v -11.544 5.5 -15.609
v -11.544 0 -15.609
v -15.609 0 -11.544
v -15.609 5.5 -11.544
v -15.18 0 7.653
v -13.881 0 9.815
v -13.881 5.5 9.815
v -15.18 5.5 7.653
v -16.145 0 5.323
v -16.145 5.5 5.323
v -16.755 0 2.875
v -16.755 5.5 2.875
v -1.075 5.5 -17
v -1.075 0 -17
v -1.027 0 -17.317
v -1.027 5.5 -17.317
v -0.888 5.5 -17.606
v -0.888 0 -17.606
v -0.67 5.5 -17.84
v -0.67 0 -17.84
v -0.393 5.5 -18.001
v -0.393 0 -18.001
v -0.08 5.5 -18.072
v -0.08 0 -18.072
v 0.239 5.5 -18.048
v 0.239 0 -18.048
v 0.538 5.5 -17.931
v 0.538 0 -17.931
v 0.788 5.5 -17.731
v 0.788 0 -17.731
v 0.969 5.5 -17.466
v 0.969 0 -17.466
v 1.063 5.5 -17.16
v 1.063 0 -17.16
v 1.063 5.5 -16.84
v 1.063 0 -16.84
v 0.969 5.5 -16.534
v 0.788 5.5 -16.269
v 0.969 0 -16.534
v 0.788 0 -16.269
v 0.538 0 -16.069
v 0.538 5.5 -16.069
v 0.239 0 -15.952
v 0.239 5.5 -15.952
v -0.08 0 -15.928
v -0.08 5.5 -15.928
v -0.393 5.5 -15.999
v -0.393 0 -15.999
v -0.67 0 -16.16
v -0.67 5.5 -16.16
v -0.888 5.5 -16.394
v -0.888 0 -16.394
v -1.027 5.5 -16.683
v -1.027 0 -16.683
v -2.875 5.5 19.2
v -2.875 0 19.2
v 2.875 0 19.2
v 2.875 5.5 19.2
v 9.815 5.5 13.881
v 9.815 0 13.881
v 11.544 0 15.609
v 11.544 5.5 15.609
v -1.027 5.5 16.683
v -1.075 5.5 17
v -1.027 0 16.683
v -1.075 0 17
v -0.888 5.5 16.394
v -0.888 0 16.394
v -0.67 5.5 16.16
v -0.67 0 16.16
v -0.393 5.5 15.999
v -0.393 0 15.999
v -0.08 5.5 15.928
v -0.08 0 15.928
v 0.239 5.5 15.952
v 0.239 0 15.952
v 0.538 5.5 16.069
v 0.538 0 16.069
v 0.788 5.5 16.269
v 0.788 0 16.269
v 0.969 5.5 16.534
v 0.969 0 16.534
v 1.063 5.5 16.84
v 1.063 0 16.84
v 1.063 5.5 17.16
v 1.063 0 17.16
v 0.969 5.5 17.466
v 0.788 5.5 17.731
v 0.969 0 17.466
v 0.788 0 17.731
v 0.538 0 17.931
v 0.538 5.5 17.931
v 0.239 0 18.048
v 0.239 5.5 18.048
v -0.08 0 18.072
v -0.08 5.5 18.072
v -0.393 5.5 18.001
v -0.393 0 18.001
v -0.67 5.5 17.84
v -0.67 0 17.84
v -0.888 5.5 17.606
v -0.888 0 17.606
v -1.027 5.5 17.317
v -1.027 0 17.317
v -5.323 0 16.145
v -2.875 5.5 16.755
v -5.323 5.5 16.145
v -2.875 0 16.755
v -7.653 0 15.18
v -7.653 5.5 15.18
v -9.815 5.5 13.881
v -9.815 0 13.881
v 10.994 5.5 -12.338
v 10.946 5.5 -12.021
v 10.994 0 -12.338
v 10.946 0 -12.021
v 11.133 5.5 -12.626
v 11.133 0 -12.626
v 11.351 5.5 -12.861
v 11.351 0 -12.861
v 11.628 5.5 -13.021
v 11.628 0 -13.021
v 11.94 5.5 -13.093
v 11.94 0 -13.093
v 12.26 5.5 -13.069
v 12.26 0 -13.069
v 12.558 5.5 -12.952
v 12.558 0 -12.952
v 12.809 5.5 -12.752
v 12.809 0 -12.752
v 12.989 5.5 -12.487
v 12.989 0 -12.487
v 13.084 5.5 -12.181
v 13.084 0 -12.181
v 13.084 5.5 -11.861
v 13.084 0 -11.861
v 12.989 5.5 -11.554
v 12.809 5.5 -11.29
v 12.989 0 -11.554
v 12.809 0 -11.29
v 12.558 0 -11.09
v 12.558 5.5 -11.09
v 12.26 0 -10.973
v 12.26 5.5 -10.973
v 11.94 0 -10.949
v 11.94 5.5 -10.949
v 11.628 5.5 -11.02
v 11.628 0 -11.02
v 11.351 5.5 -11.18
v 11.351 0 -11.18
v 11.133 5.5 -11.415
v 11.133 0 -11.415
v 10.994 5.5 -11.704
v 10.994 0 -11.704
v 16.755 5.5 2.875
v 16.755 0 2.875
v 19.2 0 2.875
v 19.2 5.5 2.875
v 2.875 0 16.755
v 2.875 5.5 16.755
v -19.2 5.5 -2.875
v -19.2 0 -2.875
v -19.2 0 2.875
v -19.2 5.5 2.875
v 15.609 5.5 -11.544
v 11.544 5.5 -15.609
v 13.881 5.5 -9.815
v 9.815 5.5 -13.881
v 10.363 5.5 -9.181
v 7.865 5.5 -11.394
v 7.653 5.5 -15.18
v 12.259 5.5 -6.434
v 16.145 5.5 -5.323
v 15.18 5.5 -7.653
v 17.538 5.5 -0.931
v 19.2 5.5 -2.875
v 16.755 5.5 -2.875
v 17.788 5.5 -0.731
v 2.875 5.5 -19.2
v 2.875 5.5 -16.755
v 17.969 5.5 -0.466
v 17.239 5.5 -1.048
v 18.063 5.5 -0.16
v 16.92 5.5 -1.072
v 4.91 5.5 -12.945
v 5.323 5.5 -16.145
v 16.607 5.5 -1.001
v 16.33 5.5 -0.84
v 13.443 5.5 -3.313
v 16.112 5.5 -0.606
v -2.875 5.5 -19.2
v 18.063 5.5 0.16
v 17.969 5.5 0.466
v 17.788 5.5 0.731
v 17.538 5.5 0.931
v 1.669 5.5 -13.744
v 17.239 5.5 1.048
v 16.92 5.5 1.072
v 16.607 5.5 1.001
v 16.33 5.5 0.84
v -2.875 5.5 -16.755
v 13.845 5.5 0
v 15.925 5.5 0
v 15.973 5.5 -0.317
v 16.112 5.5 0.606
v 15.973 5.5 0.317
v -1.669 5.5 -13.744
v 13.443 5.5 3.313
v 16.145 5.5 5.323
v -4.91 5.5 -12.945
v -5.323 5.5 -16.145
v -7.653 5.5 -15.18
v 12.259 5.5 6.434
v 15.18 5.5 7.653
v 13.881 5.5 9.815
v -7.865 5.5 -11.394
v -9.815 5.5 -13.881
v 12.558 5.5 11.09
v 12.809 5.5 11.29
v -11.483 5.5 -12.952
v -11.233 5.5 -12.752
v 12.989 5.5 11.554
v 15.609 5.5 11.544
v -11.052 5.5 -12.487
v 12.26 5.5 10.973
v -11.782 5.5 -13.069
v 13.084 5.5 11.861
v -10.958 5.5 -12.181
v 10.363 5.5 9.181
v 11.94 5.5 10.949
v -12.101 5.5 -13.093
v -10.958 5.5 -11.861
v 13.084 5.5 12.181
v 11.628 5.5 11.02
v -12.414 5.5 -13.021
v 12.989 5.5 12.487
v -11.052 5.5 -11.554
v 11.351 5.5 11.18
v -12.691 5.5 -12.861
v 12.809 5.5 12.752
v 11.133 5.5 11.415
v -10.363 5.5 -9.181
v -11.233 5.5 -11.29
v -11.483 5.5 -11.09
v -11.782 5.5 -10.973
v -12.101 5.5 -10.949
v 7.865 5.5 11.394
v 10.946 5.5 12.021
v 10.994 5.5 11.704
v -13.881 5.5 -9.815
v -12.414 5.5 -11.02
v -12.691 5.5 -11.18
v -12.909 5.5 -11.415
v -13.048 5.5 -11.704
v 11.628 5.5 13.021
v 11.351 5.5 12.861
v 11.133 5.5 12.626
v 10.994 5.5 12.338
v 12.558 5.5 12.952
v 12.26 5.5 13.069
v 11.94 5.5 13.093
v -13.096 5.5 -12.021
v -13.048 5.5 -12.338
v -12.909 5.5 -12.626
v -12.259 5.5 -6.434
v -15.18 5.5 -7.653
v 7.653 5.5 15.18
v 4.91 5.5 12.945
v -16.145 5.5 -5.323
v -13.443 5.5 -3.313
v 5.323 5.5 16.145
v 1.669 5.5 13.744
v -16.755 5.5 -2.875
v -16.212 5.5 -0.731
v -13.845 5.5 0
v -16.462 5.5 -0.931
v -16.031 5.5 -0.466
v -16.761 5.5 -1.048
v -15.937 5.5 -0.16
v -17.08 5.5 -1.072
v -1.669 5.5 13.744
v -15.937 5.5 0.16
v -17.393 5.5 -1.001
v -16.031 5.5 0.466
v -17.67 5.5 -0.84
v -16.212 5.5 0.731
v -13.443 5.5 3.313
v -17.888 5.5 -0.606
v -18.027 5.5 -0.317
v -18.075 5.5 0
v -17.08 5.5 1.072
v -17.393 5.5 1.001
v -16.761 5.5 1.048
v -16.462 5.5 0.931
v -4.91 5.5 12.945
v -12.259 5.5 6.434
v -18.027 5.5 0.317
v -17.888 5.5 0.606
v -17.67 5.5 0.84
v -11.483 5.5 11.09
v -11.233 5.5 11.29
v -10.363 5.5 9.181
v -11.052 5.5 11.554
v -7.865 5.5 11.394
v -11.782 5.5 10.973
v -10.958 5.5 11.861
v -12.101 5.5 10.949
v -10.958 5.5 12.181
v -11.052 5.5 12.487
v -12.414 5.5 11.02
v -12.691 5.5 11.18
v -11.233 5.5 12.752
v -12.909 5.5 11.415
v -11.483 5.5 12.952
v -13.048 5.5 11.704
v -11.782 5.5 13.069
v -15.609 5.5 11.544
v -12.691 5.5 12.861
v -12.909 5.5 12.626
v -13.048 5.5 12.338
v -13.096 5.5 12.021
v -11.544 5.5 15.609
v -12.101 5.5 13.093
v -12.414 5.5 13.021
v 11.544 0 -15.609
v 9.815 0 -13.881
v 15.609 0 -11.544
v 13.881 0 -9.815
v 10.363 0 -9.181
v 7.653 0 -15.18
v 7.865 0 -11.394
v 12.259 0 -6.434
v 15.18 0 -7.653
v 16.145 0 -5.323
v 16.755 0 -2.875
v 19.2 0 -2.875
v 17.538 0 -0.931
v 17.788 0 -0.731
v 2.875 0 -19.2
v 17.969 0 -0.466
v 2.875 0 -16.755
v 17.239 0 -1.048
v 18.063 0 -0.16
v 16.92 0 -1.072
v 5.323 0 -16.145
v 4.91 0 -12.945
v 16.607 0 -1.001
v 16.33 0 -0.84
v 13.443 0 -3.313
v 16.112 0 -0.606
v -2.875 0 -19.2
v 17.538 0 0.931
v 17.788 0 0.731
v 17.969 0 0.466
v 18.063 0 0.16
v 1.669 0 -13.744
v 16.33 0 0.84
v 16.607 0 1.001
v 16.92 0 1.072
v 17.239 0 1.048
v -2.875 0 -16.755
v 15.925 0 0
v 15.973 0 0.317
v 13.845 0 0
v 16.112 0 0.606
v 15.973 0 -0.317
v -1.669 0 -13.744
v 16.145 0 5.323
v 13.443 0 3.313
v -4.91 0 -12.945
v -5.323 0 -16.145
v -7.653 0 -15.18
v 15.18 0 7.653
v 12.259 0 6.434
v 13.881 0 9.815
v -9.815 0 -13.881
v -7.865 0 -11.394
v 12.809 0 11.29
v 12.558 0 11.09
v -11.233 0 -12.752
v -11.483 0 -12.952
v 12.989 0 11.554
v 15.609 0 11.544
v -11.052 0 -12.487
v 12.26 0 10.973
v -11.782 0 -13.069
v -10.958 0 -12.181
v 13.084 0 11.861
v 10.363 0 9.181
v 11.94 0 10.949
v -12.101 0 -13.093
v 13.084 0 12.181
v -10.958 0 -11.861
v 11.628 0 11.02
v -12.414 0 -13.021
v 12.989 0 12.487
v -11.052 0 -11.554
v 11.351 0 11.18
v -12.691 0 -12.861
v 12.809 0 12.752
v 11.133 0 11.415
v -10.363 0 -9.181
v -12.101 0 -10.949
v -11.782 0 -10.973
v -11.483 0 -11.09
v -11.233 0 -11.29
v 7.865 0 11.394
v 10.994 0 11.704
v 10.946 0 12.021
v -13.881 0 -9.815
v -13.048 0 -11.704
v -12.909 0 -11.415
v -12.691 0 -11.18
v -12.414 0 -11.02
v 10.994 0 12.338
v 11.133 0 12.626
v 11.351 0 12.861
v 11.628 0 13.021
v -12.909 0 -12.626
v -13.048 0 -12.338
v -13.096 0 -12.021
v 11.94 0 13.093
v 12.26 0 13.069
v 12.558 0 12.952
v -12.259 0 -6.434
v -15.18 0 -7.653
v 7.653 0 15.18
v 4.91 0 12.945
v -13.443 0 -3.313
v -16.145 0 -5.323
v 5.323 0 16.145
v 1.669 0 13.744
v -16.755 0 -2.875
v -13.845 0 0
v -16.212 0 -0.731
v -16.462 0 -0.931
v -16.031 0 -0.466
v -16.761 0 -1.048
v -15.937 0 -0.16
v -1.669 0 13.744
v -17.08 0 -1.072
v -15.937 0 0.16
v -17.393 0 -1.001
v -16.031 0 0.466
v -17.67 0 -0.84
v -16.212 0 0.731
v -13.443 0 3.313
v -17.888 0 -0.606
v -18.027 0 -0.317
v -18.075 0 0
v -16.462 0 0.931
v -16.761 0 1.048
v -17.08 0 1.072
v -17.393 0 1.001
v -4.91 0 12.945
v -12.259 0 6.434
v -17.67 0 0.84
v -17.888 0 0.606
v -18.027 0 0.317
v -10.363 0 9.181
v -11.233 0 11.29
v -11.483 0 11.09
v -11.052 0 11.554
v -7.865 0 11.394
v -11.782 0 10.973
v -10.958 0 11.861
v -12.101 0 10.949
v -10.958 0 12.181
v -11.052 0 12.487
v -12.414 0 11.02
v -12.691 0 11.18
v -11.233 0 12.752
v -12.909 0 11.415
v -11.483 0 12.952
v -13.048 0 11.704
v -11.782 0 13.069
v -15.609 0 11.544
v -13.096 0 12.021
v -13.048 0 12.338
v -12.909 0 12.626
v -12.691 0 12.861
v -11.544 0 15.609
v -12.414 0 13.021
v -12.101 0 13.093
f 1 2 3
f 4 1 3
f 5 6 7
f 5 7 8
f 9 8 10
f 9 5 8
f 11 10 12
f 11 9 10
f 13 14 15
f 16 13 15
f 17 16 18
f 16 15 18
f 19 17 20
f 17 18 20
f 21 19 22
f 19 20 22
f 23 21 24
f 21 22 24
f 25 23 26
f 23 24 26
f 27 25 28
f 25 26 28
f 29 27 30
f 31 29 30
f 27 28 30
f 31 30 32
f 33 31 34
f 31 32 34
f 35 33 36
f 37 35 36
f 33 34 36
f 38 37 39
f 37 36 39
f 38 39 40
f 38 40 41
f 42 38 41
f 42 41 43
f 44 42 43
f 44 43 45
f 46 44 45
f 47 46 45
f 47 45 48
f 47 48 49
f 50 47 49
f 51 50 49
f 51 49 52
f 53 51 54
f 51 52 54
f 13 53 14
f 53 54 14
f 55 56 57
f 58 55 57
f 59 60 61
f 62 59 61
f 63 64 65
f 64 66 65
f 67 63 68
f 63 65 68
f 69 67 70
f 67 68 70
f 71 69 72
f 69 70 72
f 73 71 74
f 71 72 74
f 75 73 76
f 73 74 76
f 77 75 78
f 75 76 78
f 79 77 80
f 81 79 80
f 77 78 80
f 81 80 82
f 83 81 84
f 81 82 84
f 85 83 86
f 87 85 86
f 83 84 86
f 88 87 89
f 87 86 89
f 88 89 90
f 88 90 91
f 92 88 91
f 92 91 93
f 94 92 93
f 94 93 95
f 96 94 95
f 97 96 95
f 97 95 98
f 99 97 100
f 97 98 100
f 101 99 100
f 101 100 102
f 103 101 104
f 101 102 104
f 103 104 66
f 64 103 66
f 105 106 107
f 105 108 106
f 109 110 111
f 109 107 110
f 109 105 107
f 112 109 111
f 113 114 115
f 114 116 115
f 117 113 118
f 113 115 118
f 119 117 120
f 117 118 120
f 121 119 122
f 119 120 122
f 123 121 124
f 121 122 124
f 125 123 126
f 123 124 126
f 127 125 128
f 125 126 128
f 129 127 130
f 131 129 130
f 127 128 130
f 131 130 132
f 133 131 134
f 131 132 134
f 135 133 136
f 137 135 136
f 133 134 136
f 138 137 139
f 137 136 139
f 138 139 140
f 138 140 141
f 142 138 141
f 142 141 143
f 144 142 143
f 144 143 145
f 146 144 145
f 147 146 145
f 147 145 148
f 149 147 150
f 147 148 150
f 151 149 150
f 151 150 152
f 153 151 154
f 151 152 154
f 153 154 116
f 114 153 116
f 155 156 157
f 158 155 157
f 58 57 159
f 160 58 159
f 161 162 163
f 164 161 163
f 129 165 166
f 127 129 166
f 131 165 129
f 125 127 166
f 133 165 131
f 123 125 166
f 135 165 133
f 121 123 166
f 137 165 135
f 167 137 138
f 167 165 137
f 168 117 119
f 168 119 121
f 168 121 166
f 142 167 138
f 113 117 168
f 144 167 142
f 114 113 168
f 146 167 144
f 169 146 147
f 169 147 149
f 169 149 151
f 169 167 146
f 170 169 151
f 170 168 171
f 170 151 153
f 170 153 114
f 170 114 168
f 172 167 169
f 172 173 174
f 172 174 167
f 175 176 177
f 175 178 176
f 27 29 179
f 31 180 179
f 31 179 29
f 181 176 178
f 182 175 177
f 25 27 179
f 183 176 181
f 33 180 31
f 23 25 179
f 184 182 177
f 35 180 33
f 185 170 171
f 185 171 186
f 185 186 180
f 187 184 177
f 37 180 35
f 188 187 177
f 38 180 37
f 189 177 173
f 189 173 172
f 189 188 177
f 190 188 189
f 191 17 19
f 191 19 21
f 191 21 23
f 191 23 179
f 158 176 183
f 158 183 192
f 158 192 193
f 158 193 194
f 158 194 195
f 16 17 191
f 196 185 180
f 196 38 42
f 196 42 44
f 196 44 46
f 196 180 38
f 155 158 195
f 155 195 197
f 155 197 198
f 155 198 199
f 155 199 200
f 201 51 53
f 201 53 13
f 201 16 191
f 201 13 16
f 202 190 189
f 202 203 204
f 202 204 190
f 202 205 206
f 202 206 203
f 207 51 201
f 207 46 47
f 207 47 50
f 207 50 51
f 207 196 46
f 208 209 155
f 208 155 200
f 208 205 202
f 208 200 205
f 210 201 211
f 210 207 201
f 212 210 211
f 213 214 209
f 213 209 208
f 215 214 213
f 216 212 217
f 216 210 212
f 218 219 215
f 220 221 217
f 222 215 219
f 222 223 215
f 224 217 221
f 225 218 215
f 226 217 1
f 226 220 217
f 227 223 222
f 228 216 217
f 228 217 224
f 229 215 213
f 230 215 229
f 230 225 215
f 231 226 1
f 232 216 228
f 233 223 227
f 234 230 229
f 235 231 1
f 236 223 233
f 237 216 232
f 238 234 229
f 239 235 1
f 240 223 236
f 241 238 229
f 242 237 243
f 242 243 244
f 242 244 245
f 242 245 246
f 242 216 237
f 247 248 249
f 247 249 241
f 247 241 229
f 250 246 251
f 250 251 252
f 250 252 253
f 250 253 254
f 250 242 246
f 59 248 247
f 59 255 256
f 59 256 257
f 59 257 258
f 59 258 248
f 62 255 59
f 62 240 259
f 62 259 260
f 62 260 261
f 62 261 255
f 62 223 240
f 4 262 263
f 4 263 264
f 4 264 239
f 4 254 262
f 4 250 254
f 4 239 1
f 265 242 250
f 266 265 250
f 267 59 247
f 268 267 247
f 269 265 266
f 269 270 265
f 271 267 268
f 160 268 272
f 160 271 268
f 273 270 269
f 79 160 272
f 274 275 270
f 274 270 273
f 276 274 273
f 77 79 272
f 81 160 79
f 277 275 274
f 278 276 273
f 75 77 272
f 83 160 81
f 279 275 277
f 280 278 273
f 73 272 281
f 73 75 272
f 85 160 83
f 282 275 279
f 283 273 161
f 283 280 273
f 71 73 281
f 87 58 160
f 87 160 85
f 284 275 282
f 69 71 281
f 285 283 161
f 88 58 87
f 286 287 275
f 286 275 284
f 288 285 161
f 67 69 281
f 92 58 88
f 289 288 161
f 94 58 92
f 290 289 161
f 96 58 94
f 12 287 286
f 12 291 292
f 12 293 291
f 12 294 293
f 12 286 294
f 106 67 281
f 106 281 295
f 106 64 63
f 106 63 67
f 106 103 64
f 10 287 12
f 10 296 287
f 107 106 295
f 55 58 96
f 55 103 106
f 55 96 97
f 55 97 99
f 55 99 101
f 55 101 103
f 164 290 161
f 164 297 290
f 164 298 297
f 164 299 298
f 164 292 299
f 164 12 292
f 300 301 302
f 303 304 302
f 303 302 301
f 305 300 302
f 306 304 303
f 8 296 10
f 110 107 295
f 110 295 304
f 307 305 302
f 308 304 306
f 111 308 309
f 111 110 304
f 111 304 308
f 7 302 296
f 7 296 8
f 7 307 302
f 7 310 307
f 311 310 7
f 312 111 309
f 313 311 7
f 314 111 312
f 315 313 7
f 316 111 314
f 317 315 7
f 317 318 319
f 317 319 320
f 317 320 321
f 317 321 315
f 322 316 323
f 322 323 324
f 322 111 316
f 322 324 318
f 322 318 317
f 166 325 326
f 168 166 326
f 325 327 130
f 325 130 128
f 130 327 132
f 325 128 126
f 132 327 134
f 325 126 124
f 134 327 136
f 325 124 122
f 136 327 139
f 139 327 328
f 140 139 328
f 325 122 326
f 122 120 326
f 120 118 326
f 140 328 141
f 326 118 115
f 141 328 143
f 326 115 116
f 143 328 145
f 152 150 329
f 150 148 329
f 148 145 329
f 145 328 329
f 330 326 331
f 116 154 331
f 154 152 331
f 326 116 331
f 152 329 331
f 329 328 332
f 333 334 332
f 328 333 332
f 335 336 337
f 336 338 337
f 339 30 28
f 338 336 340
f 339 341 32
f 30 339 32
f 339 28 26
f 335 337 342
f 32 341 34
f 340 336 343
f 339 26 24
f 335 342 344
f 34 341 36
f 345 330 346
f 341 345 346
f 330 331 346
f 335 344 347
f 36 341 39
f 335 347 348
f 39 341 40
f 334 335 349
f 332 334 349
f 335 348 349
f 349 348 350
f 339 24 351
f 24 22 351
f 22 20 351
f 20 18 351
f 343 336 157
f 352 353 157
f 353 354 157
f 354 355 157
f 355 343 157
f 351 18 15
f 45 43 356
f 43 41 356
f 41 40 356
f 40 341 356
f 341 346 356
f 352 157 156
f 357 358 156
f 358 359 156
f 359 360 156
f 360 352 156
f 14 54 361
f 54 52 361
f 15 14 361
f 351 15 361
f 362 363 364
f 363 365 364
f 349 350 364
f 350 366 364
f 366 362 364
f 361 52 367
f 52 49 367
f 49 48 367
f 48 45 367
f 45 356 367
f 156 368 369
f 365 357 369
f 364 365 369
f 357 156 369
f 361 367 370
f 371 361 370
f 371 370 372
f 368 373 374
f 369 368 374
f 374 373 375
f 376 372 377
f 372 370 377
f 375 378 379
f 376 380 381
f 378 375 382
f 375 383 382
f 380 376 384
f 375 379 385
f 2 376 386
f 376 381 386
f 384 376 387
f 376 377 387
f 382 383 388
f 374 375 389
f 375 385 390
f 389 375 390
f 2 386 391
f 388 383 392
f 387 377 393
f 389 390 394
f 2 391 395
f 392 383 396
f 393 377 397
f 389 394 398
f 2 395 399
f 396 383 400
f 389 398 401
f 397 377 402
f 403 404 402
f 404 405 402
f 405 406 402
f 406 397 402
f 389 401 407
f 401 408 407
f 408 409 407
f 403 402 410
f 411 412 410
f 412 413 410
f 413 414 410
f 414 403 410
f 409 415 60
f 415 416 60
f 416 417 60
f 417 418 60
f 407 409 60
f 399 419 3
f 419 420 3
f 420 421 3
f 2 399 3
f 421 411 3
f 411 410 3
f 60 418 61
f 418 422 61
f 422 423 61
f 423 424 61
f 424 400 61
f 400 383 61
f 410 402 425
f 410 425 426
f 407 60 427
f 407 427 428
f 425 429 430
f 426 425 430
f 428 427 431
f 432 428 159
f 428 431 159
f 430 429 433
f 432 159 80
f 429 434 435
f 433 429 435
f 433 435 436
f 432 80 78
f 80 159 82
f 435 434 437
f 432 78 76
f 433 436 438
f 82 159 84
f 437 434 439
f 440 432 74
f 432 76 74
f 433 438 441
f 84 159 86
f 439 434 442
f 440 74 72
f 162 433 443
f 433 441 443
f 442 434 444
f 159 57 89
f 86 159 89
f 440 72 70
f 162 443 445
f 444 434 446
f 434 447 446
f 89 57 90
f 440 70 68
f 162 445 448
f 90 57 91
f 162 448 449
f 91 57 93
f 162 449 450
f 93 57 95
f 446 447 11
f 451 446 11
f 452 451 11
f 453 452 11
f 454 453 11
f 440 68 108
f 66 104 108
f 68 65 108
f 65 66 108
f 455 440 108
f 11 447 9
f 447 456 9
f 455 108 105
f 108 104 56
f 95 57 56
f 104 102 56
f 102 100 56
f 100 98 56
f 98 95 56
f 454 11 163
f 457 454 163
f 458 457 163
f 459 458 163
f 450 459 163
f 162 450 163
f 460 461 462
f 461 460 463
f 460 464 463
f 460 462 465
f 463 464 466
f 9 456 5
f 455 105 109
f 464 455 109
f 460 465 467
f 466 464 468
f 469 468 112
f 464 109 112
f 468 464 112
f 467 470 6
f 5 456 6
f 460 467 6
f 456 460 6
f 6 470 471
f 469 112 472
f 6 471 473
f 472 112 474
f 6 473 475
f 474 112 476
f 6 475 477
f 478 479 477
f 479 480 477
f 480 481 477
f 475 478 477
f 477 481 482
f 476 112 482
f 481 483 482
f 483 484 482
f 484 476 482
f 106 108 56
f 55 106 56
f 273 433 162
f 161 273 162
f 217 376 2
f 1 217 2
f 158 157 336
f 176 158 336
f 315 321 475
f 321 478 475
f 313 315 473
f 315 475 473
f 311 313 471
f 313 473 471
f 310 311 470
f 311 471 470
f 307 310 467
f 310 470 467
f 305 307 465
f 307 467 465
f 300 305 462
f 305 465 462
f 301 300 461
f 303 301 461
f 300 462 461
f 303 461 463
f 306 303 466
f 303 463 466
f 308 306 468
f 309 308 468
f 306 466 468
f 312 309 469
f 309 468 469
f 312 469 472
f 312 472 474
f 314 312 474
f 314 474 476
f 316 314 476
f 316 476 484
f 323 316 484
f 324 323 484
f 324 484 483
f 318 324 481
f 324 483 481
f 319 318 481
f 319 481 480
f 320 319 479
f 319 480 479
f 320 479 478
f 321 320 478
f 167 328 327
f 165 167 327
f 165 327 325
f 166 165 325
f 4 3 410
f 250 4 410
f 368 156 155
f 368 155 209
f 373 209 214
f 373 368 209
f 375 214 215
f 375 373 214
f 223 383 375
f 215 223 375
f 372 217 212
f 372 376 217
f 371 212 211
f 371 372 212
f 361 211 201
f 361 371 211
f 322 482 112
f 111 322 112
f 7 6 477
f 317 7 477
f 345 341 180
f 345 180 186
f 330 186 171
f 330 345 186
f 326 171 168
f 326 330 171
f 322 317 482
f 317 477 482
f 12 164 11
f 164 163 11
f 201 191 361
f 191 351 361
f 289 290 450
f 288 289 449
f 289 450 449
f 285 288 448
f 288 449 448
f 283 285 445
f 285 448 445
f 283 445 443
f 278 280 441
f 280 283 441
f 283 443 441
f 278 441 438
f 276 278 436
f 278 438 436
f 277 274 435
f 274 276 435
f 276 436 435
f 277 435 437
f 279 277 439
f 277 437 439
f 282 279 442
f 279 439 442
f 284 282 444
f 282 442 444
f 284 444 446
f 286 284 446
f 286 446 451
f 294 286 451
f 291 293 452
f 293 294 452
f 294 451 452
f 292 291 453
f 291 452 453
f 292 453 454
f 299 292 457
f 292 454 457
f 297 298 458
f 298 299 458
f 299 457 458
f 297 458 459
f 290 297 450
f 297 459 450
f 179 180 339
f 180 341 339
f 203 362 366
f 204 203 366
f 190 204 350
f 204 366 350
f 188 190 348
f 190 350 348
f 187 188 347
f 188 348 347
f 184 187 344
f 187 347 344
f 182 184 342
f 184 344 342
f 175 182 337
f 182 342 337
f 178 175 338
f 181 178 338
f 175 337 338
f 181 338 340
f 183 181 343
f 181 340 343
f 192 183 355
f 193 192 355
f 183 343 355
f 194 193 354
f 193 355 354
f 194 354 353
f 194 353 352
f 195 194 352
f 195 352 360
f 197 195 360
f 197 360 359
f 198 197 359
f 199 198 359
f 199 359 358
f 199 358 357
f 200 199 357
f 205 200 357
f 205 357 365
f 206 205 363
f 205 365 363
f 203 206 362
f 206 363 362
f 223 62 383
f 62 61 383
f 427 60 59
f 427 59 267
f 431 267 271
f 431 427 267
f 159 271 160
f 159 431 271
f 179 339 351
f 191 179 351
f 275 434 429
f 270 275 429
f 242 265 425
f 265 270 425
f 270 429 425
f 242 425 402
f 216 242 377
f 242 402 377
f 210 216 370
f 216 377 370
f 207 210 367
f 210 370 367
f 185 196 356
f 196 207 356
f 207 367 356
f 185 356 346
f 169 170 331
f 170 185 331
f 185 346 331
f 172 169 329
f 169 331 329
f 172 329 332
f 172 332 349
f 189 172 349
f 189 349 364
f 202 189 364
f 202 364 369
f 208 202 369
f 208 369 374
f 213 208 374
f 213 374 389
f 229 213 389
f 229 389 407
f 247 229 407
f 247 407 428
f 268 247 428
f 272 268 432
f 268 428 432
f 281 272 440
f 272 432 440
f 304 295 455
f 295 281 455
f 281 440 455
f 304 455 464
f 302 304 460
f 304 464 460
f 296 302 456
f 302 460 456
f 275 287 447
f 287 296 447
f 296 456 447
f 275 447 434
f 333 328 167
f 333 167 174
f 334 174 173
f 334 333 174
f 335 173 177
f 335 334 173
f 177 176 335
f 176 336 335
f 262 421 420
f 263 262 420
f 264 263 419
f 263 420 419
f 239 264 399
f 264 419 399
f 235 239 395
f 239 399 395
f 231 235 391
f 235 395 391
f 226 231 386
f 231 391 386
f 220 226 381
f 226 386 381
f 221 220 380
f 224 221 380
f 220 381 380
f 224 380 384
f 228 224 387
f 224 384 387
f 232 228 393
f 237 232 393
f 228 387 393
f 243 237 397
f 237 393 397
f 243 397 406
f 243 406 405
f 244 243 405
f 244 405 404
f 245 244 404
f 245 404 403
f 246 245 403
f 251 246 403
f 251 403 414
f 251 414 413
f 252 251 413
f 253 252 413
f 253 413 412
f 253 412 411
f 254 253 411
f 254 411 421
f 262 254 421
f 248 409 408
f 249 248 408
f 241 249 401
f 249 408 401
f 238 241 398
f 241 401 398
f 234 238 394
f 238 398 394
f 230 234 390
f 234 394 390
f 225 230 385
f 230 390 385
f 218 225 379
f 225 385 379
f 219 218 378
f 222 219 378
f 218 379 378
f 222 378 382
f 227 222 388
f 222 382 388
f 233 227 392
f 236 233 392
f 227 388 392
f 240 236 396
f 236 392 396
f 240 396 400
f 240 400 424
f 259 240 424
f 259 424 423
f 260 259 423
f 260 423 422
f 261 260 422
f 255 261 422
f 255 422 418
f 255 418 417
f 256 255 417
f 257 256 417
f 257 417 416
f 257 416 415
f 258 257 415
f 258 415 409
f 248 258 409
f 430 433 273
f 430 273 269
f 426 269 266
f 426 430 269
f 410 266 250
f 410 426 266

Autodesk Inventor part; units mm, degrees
ref_plane "YZ Plane" through (0, 0, 0) normal (1, 0, 0) x (0, 1, 0)
ref_plane "XZ Plane" through (0, 0, 0) normal (0, 1, 0) x (-1, 0, 0)
ref_plane "XY Plane" through (0, 0, 0) normal (0, 0, 1) x (1, 0, 0)
sketch "Sketch1" plane through (0, 0, 0) normal (0, 1, 0) x (-1, 0, 0)
  circle A0 centre (0, 0) radius 17
  circle A1 centre (0, 0) radius 13.845
  circle A2 centre (17, 0) radius 1.075
  line L0 (19.2, 2.875) -> (14.8, 2.875)
  line L1 (14.8, 2.875) -> (14.8, -2.875)
  line L2 (14.8, -2.875) -> (19.2, -2.875)
  line L3 (19.2, -2.875) -> (19.2, 2.875)
  line L4 (19.2, 2.875) -> (14.8, -2.875) construction
  line L5 (14.8, 2.875) -> (19.2, -2.875) construction
  circle A3 centre (12.0208, 12.0208) radius 1.075
  line L6 (11.5435, 15.6094) -> (8.4322, 12.4981)
  line L7 (8.4322, 12.4981) -> (12.4981, 8.4322)
  line L8 (12.4981, 8.4322) -> (15.6094, 11.5435)
  line L9 (15.6094, 11.5435) -> (11.5435, 15.6094)
  line L10 (11.5435, 15.6094) -> (12.4981, 8.4322) construction
  line L11 (8.4322, 12.4981) -> (15.6094, 11.5435) construction
  circle A4 centre (0, 17) radius 1.075
  line L12 (-2.875, 19.2) -> (-2.875, 14.8)
  line L13 (-2.875, 14.8) -> (2.875, 14.8)
  line L14 (2.875, 14.8) -> (2.875, 19.2)
  line L15 (2.875, 19.2) -> (-2.875, 19.2)
  line L16 (-2.875, 19.2) -> (2.875, 14.8) construction
  line L17 (-2.875, 14.8) -> (2.875, 19.2) construction
  circle A5 centre (-12.0208, 12.0208) radius 1.075
  line L18 (-15.6094, 11.5435) -> (-12.4981, 8.4322)
  line L19 (-12.4981, 8.4322) -> (-8.4322, 12.4981)
  line L20 (-8.4322, 12.4981) -> (-11.5435, 15.6094)
  line L21 (-11.5435, 15.6094) -> (-15.6094, 11.5435)
  line L22 (-15.6094, 11.5435) -> (-8.4322, 12.4981) construction
  line L23 (-12.4981, 8.4322) -> (-11.5435, 15.6094) construction
  circle A6 centre (-17, 0) radius 1.075
  line L24 (-19.2, -2.875) -> (-14.8, -2.875)
  line L25 (-14.8, -2.875) -> (-14.8, 2.875)
  line L26 (-14.8, 2.875) -> (-19.2, 2.875)
  line L27 (-19.2, 2.875) -> (-19.2, -2.875)
  line L28 (-19.2, -2.875) -> (-14.8, 2.875) construction
  line L29 (-14.8, -2.875) -> (-19.2, 2.875) construction
  circle A7 centre (-12.0208, -12.0208) radius 1.075
  line L30 (-11.5435, -15.6094) -> (-8.4322, -12.4981)
  line L31 (-8.4322, -12.4981) -> (-12.4981, -8.4322)
  line L32 (-12.4981, -8.4322) -> (-15.6094, -11.5435)
  line L33 (-15.6094, -11.5435) -> (-11.5435, -15.6094)
  line L34 (-11.5435, -15.6094) -> (-12.4981, -8.4322) construction
  line L35 (-8.4322, -12.4981) -> (-15.6094, -11.5435) construction
  circle A8 centre (0, -17) radius 1.075
  line L36 (2.875, -19.2) -> (2.875, -14.8)
  line L37 (2.875, -14.8) -> (-2.875, -14.8)
  line L38 (-2.875, -14.8) -> (-2.875, -19.2)
  line L39 (-2.875, -19.2) -> (2.875, -19.2)
  line L40 (2.875, -19.2) -> (-2.875, -14.8) construction
  line L41 (2.875, -14.8) -> (-2.875, -19.2) construction
  circle A9 centre (12.0208, -12.0208) radius 1.075
  line L42 (15.6094, -11.5435) -> (12.4981, -8.4322)
  line L43 (12.4981, -8.4322) -> (8.4322, -12.4981)
  line L44 (8.4322, -12.4981) -> (11.5435, -15.6094)
  line L45 (11.5435, -15.6094) -> (15.6094, -11.5435)
  line L46 (15.6094, -11.5435) -> (8.4322, -12.4981) construction
  line L47 (12.4981, -8.4322) -> (11.5435, -15.6094) construction
  point P0 (16.7551, 2.875)
  point P1 (13.8806, 9.8147)
  point P2 (9.8147, 13.8806)
  point P3 (2.875, 16.7551)
  point P4 (-2.875, 16.7551)
  point P5 (-9.8147, 13.8806)
  point P6 (-13.8806, 9.8147)
  point P7 (-16.7551, 2.875)
  point P8 (-16.7551, -2.875)
  point P9 (-13.8806, -9.8147)
  point P10 (-9.8147, -13.8806)
  point P11 (-2.875, -16.7551)
  point P12 (2.875, -16.7551)
  point P13 (9.8147, -13.8806)
  point P14 (13.8806, -9.8147)
  point P15 (16.7551, -2.875)
  dimension "d0" = 34
  dimension "d1" = 27.69
  dimension "d2" = 5.75
  dimension "d3" = 2.15
  dimension "d4" = 4.4
  dimension "d7" = 360
extrude "Extrusion1" add sketch "Sketch1" along normal blind 5.5 contours A2 A0 L2 L1 L0 | A0 L0 L3 L2 A2 | L0 L1 L2 A0 L42 L43 L44 L36 L37 L38 L30 L31 L32 L24 L25 L26 L18 L19 L20 L12 L13 L14 L6 L7 L8 | L8 L7 L6 A0 A3 | A0 A3 L6 L9 L8 | L42 L45 L44 A0 A9 | A0 A9 L44 L43 L42 | L14 L13 L12 A0 A4 | A0 A4 L12 L15 L14 | L36 L39 L38 A0 A8 | A0 A8 L38 L37 L36 | L20 L19 L18 A0 A5 | A0 A5 L18 L21 L20 | L30 L33 L32 A0 A7 | A0 A7 L32 L31 L30 | L26 L25 L24 A0 A6 | A0 A6 L24 L27 L26
properties part number "24vFastener"
